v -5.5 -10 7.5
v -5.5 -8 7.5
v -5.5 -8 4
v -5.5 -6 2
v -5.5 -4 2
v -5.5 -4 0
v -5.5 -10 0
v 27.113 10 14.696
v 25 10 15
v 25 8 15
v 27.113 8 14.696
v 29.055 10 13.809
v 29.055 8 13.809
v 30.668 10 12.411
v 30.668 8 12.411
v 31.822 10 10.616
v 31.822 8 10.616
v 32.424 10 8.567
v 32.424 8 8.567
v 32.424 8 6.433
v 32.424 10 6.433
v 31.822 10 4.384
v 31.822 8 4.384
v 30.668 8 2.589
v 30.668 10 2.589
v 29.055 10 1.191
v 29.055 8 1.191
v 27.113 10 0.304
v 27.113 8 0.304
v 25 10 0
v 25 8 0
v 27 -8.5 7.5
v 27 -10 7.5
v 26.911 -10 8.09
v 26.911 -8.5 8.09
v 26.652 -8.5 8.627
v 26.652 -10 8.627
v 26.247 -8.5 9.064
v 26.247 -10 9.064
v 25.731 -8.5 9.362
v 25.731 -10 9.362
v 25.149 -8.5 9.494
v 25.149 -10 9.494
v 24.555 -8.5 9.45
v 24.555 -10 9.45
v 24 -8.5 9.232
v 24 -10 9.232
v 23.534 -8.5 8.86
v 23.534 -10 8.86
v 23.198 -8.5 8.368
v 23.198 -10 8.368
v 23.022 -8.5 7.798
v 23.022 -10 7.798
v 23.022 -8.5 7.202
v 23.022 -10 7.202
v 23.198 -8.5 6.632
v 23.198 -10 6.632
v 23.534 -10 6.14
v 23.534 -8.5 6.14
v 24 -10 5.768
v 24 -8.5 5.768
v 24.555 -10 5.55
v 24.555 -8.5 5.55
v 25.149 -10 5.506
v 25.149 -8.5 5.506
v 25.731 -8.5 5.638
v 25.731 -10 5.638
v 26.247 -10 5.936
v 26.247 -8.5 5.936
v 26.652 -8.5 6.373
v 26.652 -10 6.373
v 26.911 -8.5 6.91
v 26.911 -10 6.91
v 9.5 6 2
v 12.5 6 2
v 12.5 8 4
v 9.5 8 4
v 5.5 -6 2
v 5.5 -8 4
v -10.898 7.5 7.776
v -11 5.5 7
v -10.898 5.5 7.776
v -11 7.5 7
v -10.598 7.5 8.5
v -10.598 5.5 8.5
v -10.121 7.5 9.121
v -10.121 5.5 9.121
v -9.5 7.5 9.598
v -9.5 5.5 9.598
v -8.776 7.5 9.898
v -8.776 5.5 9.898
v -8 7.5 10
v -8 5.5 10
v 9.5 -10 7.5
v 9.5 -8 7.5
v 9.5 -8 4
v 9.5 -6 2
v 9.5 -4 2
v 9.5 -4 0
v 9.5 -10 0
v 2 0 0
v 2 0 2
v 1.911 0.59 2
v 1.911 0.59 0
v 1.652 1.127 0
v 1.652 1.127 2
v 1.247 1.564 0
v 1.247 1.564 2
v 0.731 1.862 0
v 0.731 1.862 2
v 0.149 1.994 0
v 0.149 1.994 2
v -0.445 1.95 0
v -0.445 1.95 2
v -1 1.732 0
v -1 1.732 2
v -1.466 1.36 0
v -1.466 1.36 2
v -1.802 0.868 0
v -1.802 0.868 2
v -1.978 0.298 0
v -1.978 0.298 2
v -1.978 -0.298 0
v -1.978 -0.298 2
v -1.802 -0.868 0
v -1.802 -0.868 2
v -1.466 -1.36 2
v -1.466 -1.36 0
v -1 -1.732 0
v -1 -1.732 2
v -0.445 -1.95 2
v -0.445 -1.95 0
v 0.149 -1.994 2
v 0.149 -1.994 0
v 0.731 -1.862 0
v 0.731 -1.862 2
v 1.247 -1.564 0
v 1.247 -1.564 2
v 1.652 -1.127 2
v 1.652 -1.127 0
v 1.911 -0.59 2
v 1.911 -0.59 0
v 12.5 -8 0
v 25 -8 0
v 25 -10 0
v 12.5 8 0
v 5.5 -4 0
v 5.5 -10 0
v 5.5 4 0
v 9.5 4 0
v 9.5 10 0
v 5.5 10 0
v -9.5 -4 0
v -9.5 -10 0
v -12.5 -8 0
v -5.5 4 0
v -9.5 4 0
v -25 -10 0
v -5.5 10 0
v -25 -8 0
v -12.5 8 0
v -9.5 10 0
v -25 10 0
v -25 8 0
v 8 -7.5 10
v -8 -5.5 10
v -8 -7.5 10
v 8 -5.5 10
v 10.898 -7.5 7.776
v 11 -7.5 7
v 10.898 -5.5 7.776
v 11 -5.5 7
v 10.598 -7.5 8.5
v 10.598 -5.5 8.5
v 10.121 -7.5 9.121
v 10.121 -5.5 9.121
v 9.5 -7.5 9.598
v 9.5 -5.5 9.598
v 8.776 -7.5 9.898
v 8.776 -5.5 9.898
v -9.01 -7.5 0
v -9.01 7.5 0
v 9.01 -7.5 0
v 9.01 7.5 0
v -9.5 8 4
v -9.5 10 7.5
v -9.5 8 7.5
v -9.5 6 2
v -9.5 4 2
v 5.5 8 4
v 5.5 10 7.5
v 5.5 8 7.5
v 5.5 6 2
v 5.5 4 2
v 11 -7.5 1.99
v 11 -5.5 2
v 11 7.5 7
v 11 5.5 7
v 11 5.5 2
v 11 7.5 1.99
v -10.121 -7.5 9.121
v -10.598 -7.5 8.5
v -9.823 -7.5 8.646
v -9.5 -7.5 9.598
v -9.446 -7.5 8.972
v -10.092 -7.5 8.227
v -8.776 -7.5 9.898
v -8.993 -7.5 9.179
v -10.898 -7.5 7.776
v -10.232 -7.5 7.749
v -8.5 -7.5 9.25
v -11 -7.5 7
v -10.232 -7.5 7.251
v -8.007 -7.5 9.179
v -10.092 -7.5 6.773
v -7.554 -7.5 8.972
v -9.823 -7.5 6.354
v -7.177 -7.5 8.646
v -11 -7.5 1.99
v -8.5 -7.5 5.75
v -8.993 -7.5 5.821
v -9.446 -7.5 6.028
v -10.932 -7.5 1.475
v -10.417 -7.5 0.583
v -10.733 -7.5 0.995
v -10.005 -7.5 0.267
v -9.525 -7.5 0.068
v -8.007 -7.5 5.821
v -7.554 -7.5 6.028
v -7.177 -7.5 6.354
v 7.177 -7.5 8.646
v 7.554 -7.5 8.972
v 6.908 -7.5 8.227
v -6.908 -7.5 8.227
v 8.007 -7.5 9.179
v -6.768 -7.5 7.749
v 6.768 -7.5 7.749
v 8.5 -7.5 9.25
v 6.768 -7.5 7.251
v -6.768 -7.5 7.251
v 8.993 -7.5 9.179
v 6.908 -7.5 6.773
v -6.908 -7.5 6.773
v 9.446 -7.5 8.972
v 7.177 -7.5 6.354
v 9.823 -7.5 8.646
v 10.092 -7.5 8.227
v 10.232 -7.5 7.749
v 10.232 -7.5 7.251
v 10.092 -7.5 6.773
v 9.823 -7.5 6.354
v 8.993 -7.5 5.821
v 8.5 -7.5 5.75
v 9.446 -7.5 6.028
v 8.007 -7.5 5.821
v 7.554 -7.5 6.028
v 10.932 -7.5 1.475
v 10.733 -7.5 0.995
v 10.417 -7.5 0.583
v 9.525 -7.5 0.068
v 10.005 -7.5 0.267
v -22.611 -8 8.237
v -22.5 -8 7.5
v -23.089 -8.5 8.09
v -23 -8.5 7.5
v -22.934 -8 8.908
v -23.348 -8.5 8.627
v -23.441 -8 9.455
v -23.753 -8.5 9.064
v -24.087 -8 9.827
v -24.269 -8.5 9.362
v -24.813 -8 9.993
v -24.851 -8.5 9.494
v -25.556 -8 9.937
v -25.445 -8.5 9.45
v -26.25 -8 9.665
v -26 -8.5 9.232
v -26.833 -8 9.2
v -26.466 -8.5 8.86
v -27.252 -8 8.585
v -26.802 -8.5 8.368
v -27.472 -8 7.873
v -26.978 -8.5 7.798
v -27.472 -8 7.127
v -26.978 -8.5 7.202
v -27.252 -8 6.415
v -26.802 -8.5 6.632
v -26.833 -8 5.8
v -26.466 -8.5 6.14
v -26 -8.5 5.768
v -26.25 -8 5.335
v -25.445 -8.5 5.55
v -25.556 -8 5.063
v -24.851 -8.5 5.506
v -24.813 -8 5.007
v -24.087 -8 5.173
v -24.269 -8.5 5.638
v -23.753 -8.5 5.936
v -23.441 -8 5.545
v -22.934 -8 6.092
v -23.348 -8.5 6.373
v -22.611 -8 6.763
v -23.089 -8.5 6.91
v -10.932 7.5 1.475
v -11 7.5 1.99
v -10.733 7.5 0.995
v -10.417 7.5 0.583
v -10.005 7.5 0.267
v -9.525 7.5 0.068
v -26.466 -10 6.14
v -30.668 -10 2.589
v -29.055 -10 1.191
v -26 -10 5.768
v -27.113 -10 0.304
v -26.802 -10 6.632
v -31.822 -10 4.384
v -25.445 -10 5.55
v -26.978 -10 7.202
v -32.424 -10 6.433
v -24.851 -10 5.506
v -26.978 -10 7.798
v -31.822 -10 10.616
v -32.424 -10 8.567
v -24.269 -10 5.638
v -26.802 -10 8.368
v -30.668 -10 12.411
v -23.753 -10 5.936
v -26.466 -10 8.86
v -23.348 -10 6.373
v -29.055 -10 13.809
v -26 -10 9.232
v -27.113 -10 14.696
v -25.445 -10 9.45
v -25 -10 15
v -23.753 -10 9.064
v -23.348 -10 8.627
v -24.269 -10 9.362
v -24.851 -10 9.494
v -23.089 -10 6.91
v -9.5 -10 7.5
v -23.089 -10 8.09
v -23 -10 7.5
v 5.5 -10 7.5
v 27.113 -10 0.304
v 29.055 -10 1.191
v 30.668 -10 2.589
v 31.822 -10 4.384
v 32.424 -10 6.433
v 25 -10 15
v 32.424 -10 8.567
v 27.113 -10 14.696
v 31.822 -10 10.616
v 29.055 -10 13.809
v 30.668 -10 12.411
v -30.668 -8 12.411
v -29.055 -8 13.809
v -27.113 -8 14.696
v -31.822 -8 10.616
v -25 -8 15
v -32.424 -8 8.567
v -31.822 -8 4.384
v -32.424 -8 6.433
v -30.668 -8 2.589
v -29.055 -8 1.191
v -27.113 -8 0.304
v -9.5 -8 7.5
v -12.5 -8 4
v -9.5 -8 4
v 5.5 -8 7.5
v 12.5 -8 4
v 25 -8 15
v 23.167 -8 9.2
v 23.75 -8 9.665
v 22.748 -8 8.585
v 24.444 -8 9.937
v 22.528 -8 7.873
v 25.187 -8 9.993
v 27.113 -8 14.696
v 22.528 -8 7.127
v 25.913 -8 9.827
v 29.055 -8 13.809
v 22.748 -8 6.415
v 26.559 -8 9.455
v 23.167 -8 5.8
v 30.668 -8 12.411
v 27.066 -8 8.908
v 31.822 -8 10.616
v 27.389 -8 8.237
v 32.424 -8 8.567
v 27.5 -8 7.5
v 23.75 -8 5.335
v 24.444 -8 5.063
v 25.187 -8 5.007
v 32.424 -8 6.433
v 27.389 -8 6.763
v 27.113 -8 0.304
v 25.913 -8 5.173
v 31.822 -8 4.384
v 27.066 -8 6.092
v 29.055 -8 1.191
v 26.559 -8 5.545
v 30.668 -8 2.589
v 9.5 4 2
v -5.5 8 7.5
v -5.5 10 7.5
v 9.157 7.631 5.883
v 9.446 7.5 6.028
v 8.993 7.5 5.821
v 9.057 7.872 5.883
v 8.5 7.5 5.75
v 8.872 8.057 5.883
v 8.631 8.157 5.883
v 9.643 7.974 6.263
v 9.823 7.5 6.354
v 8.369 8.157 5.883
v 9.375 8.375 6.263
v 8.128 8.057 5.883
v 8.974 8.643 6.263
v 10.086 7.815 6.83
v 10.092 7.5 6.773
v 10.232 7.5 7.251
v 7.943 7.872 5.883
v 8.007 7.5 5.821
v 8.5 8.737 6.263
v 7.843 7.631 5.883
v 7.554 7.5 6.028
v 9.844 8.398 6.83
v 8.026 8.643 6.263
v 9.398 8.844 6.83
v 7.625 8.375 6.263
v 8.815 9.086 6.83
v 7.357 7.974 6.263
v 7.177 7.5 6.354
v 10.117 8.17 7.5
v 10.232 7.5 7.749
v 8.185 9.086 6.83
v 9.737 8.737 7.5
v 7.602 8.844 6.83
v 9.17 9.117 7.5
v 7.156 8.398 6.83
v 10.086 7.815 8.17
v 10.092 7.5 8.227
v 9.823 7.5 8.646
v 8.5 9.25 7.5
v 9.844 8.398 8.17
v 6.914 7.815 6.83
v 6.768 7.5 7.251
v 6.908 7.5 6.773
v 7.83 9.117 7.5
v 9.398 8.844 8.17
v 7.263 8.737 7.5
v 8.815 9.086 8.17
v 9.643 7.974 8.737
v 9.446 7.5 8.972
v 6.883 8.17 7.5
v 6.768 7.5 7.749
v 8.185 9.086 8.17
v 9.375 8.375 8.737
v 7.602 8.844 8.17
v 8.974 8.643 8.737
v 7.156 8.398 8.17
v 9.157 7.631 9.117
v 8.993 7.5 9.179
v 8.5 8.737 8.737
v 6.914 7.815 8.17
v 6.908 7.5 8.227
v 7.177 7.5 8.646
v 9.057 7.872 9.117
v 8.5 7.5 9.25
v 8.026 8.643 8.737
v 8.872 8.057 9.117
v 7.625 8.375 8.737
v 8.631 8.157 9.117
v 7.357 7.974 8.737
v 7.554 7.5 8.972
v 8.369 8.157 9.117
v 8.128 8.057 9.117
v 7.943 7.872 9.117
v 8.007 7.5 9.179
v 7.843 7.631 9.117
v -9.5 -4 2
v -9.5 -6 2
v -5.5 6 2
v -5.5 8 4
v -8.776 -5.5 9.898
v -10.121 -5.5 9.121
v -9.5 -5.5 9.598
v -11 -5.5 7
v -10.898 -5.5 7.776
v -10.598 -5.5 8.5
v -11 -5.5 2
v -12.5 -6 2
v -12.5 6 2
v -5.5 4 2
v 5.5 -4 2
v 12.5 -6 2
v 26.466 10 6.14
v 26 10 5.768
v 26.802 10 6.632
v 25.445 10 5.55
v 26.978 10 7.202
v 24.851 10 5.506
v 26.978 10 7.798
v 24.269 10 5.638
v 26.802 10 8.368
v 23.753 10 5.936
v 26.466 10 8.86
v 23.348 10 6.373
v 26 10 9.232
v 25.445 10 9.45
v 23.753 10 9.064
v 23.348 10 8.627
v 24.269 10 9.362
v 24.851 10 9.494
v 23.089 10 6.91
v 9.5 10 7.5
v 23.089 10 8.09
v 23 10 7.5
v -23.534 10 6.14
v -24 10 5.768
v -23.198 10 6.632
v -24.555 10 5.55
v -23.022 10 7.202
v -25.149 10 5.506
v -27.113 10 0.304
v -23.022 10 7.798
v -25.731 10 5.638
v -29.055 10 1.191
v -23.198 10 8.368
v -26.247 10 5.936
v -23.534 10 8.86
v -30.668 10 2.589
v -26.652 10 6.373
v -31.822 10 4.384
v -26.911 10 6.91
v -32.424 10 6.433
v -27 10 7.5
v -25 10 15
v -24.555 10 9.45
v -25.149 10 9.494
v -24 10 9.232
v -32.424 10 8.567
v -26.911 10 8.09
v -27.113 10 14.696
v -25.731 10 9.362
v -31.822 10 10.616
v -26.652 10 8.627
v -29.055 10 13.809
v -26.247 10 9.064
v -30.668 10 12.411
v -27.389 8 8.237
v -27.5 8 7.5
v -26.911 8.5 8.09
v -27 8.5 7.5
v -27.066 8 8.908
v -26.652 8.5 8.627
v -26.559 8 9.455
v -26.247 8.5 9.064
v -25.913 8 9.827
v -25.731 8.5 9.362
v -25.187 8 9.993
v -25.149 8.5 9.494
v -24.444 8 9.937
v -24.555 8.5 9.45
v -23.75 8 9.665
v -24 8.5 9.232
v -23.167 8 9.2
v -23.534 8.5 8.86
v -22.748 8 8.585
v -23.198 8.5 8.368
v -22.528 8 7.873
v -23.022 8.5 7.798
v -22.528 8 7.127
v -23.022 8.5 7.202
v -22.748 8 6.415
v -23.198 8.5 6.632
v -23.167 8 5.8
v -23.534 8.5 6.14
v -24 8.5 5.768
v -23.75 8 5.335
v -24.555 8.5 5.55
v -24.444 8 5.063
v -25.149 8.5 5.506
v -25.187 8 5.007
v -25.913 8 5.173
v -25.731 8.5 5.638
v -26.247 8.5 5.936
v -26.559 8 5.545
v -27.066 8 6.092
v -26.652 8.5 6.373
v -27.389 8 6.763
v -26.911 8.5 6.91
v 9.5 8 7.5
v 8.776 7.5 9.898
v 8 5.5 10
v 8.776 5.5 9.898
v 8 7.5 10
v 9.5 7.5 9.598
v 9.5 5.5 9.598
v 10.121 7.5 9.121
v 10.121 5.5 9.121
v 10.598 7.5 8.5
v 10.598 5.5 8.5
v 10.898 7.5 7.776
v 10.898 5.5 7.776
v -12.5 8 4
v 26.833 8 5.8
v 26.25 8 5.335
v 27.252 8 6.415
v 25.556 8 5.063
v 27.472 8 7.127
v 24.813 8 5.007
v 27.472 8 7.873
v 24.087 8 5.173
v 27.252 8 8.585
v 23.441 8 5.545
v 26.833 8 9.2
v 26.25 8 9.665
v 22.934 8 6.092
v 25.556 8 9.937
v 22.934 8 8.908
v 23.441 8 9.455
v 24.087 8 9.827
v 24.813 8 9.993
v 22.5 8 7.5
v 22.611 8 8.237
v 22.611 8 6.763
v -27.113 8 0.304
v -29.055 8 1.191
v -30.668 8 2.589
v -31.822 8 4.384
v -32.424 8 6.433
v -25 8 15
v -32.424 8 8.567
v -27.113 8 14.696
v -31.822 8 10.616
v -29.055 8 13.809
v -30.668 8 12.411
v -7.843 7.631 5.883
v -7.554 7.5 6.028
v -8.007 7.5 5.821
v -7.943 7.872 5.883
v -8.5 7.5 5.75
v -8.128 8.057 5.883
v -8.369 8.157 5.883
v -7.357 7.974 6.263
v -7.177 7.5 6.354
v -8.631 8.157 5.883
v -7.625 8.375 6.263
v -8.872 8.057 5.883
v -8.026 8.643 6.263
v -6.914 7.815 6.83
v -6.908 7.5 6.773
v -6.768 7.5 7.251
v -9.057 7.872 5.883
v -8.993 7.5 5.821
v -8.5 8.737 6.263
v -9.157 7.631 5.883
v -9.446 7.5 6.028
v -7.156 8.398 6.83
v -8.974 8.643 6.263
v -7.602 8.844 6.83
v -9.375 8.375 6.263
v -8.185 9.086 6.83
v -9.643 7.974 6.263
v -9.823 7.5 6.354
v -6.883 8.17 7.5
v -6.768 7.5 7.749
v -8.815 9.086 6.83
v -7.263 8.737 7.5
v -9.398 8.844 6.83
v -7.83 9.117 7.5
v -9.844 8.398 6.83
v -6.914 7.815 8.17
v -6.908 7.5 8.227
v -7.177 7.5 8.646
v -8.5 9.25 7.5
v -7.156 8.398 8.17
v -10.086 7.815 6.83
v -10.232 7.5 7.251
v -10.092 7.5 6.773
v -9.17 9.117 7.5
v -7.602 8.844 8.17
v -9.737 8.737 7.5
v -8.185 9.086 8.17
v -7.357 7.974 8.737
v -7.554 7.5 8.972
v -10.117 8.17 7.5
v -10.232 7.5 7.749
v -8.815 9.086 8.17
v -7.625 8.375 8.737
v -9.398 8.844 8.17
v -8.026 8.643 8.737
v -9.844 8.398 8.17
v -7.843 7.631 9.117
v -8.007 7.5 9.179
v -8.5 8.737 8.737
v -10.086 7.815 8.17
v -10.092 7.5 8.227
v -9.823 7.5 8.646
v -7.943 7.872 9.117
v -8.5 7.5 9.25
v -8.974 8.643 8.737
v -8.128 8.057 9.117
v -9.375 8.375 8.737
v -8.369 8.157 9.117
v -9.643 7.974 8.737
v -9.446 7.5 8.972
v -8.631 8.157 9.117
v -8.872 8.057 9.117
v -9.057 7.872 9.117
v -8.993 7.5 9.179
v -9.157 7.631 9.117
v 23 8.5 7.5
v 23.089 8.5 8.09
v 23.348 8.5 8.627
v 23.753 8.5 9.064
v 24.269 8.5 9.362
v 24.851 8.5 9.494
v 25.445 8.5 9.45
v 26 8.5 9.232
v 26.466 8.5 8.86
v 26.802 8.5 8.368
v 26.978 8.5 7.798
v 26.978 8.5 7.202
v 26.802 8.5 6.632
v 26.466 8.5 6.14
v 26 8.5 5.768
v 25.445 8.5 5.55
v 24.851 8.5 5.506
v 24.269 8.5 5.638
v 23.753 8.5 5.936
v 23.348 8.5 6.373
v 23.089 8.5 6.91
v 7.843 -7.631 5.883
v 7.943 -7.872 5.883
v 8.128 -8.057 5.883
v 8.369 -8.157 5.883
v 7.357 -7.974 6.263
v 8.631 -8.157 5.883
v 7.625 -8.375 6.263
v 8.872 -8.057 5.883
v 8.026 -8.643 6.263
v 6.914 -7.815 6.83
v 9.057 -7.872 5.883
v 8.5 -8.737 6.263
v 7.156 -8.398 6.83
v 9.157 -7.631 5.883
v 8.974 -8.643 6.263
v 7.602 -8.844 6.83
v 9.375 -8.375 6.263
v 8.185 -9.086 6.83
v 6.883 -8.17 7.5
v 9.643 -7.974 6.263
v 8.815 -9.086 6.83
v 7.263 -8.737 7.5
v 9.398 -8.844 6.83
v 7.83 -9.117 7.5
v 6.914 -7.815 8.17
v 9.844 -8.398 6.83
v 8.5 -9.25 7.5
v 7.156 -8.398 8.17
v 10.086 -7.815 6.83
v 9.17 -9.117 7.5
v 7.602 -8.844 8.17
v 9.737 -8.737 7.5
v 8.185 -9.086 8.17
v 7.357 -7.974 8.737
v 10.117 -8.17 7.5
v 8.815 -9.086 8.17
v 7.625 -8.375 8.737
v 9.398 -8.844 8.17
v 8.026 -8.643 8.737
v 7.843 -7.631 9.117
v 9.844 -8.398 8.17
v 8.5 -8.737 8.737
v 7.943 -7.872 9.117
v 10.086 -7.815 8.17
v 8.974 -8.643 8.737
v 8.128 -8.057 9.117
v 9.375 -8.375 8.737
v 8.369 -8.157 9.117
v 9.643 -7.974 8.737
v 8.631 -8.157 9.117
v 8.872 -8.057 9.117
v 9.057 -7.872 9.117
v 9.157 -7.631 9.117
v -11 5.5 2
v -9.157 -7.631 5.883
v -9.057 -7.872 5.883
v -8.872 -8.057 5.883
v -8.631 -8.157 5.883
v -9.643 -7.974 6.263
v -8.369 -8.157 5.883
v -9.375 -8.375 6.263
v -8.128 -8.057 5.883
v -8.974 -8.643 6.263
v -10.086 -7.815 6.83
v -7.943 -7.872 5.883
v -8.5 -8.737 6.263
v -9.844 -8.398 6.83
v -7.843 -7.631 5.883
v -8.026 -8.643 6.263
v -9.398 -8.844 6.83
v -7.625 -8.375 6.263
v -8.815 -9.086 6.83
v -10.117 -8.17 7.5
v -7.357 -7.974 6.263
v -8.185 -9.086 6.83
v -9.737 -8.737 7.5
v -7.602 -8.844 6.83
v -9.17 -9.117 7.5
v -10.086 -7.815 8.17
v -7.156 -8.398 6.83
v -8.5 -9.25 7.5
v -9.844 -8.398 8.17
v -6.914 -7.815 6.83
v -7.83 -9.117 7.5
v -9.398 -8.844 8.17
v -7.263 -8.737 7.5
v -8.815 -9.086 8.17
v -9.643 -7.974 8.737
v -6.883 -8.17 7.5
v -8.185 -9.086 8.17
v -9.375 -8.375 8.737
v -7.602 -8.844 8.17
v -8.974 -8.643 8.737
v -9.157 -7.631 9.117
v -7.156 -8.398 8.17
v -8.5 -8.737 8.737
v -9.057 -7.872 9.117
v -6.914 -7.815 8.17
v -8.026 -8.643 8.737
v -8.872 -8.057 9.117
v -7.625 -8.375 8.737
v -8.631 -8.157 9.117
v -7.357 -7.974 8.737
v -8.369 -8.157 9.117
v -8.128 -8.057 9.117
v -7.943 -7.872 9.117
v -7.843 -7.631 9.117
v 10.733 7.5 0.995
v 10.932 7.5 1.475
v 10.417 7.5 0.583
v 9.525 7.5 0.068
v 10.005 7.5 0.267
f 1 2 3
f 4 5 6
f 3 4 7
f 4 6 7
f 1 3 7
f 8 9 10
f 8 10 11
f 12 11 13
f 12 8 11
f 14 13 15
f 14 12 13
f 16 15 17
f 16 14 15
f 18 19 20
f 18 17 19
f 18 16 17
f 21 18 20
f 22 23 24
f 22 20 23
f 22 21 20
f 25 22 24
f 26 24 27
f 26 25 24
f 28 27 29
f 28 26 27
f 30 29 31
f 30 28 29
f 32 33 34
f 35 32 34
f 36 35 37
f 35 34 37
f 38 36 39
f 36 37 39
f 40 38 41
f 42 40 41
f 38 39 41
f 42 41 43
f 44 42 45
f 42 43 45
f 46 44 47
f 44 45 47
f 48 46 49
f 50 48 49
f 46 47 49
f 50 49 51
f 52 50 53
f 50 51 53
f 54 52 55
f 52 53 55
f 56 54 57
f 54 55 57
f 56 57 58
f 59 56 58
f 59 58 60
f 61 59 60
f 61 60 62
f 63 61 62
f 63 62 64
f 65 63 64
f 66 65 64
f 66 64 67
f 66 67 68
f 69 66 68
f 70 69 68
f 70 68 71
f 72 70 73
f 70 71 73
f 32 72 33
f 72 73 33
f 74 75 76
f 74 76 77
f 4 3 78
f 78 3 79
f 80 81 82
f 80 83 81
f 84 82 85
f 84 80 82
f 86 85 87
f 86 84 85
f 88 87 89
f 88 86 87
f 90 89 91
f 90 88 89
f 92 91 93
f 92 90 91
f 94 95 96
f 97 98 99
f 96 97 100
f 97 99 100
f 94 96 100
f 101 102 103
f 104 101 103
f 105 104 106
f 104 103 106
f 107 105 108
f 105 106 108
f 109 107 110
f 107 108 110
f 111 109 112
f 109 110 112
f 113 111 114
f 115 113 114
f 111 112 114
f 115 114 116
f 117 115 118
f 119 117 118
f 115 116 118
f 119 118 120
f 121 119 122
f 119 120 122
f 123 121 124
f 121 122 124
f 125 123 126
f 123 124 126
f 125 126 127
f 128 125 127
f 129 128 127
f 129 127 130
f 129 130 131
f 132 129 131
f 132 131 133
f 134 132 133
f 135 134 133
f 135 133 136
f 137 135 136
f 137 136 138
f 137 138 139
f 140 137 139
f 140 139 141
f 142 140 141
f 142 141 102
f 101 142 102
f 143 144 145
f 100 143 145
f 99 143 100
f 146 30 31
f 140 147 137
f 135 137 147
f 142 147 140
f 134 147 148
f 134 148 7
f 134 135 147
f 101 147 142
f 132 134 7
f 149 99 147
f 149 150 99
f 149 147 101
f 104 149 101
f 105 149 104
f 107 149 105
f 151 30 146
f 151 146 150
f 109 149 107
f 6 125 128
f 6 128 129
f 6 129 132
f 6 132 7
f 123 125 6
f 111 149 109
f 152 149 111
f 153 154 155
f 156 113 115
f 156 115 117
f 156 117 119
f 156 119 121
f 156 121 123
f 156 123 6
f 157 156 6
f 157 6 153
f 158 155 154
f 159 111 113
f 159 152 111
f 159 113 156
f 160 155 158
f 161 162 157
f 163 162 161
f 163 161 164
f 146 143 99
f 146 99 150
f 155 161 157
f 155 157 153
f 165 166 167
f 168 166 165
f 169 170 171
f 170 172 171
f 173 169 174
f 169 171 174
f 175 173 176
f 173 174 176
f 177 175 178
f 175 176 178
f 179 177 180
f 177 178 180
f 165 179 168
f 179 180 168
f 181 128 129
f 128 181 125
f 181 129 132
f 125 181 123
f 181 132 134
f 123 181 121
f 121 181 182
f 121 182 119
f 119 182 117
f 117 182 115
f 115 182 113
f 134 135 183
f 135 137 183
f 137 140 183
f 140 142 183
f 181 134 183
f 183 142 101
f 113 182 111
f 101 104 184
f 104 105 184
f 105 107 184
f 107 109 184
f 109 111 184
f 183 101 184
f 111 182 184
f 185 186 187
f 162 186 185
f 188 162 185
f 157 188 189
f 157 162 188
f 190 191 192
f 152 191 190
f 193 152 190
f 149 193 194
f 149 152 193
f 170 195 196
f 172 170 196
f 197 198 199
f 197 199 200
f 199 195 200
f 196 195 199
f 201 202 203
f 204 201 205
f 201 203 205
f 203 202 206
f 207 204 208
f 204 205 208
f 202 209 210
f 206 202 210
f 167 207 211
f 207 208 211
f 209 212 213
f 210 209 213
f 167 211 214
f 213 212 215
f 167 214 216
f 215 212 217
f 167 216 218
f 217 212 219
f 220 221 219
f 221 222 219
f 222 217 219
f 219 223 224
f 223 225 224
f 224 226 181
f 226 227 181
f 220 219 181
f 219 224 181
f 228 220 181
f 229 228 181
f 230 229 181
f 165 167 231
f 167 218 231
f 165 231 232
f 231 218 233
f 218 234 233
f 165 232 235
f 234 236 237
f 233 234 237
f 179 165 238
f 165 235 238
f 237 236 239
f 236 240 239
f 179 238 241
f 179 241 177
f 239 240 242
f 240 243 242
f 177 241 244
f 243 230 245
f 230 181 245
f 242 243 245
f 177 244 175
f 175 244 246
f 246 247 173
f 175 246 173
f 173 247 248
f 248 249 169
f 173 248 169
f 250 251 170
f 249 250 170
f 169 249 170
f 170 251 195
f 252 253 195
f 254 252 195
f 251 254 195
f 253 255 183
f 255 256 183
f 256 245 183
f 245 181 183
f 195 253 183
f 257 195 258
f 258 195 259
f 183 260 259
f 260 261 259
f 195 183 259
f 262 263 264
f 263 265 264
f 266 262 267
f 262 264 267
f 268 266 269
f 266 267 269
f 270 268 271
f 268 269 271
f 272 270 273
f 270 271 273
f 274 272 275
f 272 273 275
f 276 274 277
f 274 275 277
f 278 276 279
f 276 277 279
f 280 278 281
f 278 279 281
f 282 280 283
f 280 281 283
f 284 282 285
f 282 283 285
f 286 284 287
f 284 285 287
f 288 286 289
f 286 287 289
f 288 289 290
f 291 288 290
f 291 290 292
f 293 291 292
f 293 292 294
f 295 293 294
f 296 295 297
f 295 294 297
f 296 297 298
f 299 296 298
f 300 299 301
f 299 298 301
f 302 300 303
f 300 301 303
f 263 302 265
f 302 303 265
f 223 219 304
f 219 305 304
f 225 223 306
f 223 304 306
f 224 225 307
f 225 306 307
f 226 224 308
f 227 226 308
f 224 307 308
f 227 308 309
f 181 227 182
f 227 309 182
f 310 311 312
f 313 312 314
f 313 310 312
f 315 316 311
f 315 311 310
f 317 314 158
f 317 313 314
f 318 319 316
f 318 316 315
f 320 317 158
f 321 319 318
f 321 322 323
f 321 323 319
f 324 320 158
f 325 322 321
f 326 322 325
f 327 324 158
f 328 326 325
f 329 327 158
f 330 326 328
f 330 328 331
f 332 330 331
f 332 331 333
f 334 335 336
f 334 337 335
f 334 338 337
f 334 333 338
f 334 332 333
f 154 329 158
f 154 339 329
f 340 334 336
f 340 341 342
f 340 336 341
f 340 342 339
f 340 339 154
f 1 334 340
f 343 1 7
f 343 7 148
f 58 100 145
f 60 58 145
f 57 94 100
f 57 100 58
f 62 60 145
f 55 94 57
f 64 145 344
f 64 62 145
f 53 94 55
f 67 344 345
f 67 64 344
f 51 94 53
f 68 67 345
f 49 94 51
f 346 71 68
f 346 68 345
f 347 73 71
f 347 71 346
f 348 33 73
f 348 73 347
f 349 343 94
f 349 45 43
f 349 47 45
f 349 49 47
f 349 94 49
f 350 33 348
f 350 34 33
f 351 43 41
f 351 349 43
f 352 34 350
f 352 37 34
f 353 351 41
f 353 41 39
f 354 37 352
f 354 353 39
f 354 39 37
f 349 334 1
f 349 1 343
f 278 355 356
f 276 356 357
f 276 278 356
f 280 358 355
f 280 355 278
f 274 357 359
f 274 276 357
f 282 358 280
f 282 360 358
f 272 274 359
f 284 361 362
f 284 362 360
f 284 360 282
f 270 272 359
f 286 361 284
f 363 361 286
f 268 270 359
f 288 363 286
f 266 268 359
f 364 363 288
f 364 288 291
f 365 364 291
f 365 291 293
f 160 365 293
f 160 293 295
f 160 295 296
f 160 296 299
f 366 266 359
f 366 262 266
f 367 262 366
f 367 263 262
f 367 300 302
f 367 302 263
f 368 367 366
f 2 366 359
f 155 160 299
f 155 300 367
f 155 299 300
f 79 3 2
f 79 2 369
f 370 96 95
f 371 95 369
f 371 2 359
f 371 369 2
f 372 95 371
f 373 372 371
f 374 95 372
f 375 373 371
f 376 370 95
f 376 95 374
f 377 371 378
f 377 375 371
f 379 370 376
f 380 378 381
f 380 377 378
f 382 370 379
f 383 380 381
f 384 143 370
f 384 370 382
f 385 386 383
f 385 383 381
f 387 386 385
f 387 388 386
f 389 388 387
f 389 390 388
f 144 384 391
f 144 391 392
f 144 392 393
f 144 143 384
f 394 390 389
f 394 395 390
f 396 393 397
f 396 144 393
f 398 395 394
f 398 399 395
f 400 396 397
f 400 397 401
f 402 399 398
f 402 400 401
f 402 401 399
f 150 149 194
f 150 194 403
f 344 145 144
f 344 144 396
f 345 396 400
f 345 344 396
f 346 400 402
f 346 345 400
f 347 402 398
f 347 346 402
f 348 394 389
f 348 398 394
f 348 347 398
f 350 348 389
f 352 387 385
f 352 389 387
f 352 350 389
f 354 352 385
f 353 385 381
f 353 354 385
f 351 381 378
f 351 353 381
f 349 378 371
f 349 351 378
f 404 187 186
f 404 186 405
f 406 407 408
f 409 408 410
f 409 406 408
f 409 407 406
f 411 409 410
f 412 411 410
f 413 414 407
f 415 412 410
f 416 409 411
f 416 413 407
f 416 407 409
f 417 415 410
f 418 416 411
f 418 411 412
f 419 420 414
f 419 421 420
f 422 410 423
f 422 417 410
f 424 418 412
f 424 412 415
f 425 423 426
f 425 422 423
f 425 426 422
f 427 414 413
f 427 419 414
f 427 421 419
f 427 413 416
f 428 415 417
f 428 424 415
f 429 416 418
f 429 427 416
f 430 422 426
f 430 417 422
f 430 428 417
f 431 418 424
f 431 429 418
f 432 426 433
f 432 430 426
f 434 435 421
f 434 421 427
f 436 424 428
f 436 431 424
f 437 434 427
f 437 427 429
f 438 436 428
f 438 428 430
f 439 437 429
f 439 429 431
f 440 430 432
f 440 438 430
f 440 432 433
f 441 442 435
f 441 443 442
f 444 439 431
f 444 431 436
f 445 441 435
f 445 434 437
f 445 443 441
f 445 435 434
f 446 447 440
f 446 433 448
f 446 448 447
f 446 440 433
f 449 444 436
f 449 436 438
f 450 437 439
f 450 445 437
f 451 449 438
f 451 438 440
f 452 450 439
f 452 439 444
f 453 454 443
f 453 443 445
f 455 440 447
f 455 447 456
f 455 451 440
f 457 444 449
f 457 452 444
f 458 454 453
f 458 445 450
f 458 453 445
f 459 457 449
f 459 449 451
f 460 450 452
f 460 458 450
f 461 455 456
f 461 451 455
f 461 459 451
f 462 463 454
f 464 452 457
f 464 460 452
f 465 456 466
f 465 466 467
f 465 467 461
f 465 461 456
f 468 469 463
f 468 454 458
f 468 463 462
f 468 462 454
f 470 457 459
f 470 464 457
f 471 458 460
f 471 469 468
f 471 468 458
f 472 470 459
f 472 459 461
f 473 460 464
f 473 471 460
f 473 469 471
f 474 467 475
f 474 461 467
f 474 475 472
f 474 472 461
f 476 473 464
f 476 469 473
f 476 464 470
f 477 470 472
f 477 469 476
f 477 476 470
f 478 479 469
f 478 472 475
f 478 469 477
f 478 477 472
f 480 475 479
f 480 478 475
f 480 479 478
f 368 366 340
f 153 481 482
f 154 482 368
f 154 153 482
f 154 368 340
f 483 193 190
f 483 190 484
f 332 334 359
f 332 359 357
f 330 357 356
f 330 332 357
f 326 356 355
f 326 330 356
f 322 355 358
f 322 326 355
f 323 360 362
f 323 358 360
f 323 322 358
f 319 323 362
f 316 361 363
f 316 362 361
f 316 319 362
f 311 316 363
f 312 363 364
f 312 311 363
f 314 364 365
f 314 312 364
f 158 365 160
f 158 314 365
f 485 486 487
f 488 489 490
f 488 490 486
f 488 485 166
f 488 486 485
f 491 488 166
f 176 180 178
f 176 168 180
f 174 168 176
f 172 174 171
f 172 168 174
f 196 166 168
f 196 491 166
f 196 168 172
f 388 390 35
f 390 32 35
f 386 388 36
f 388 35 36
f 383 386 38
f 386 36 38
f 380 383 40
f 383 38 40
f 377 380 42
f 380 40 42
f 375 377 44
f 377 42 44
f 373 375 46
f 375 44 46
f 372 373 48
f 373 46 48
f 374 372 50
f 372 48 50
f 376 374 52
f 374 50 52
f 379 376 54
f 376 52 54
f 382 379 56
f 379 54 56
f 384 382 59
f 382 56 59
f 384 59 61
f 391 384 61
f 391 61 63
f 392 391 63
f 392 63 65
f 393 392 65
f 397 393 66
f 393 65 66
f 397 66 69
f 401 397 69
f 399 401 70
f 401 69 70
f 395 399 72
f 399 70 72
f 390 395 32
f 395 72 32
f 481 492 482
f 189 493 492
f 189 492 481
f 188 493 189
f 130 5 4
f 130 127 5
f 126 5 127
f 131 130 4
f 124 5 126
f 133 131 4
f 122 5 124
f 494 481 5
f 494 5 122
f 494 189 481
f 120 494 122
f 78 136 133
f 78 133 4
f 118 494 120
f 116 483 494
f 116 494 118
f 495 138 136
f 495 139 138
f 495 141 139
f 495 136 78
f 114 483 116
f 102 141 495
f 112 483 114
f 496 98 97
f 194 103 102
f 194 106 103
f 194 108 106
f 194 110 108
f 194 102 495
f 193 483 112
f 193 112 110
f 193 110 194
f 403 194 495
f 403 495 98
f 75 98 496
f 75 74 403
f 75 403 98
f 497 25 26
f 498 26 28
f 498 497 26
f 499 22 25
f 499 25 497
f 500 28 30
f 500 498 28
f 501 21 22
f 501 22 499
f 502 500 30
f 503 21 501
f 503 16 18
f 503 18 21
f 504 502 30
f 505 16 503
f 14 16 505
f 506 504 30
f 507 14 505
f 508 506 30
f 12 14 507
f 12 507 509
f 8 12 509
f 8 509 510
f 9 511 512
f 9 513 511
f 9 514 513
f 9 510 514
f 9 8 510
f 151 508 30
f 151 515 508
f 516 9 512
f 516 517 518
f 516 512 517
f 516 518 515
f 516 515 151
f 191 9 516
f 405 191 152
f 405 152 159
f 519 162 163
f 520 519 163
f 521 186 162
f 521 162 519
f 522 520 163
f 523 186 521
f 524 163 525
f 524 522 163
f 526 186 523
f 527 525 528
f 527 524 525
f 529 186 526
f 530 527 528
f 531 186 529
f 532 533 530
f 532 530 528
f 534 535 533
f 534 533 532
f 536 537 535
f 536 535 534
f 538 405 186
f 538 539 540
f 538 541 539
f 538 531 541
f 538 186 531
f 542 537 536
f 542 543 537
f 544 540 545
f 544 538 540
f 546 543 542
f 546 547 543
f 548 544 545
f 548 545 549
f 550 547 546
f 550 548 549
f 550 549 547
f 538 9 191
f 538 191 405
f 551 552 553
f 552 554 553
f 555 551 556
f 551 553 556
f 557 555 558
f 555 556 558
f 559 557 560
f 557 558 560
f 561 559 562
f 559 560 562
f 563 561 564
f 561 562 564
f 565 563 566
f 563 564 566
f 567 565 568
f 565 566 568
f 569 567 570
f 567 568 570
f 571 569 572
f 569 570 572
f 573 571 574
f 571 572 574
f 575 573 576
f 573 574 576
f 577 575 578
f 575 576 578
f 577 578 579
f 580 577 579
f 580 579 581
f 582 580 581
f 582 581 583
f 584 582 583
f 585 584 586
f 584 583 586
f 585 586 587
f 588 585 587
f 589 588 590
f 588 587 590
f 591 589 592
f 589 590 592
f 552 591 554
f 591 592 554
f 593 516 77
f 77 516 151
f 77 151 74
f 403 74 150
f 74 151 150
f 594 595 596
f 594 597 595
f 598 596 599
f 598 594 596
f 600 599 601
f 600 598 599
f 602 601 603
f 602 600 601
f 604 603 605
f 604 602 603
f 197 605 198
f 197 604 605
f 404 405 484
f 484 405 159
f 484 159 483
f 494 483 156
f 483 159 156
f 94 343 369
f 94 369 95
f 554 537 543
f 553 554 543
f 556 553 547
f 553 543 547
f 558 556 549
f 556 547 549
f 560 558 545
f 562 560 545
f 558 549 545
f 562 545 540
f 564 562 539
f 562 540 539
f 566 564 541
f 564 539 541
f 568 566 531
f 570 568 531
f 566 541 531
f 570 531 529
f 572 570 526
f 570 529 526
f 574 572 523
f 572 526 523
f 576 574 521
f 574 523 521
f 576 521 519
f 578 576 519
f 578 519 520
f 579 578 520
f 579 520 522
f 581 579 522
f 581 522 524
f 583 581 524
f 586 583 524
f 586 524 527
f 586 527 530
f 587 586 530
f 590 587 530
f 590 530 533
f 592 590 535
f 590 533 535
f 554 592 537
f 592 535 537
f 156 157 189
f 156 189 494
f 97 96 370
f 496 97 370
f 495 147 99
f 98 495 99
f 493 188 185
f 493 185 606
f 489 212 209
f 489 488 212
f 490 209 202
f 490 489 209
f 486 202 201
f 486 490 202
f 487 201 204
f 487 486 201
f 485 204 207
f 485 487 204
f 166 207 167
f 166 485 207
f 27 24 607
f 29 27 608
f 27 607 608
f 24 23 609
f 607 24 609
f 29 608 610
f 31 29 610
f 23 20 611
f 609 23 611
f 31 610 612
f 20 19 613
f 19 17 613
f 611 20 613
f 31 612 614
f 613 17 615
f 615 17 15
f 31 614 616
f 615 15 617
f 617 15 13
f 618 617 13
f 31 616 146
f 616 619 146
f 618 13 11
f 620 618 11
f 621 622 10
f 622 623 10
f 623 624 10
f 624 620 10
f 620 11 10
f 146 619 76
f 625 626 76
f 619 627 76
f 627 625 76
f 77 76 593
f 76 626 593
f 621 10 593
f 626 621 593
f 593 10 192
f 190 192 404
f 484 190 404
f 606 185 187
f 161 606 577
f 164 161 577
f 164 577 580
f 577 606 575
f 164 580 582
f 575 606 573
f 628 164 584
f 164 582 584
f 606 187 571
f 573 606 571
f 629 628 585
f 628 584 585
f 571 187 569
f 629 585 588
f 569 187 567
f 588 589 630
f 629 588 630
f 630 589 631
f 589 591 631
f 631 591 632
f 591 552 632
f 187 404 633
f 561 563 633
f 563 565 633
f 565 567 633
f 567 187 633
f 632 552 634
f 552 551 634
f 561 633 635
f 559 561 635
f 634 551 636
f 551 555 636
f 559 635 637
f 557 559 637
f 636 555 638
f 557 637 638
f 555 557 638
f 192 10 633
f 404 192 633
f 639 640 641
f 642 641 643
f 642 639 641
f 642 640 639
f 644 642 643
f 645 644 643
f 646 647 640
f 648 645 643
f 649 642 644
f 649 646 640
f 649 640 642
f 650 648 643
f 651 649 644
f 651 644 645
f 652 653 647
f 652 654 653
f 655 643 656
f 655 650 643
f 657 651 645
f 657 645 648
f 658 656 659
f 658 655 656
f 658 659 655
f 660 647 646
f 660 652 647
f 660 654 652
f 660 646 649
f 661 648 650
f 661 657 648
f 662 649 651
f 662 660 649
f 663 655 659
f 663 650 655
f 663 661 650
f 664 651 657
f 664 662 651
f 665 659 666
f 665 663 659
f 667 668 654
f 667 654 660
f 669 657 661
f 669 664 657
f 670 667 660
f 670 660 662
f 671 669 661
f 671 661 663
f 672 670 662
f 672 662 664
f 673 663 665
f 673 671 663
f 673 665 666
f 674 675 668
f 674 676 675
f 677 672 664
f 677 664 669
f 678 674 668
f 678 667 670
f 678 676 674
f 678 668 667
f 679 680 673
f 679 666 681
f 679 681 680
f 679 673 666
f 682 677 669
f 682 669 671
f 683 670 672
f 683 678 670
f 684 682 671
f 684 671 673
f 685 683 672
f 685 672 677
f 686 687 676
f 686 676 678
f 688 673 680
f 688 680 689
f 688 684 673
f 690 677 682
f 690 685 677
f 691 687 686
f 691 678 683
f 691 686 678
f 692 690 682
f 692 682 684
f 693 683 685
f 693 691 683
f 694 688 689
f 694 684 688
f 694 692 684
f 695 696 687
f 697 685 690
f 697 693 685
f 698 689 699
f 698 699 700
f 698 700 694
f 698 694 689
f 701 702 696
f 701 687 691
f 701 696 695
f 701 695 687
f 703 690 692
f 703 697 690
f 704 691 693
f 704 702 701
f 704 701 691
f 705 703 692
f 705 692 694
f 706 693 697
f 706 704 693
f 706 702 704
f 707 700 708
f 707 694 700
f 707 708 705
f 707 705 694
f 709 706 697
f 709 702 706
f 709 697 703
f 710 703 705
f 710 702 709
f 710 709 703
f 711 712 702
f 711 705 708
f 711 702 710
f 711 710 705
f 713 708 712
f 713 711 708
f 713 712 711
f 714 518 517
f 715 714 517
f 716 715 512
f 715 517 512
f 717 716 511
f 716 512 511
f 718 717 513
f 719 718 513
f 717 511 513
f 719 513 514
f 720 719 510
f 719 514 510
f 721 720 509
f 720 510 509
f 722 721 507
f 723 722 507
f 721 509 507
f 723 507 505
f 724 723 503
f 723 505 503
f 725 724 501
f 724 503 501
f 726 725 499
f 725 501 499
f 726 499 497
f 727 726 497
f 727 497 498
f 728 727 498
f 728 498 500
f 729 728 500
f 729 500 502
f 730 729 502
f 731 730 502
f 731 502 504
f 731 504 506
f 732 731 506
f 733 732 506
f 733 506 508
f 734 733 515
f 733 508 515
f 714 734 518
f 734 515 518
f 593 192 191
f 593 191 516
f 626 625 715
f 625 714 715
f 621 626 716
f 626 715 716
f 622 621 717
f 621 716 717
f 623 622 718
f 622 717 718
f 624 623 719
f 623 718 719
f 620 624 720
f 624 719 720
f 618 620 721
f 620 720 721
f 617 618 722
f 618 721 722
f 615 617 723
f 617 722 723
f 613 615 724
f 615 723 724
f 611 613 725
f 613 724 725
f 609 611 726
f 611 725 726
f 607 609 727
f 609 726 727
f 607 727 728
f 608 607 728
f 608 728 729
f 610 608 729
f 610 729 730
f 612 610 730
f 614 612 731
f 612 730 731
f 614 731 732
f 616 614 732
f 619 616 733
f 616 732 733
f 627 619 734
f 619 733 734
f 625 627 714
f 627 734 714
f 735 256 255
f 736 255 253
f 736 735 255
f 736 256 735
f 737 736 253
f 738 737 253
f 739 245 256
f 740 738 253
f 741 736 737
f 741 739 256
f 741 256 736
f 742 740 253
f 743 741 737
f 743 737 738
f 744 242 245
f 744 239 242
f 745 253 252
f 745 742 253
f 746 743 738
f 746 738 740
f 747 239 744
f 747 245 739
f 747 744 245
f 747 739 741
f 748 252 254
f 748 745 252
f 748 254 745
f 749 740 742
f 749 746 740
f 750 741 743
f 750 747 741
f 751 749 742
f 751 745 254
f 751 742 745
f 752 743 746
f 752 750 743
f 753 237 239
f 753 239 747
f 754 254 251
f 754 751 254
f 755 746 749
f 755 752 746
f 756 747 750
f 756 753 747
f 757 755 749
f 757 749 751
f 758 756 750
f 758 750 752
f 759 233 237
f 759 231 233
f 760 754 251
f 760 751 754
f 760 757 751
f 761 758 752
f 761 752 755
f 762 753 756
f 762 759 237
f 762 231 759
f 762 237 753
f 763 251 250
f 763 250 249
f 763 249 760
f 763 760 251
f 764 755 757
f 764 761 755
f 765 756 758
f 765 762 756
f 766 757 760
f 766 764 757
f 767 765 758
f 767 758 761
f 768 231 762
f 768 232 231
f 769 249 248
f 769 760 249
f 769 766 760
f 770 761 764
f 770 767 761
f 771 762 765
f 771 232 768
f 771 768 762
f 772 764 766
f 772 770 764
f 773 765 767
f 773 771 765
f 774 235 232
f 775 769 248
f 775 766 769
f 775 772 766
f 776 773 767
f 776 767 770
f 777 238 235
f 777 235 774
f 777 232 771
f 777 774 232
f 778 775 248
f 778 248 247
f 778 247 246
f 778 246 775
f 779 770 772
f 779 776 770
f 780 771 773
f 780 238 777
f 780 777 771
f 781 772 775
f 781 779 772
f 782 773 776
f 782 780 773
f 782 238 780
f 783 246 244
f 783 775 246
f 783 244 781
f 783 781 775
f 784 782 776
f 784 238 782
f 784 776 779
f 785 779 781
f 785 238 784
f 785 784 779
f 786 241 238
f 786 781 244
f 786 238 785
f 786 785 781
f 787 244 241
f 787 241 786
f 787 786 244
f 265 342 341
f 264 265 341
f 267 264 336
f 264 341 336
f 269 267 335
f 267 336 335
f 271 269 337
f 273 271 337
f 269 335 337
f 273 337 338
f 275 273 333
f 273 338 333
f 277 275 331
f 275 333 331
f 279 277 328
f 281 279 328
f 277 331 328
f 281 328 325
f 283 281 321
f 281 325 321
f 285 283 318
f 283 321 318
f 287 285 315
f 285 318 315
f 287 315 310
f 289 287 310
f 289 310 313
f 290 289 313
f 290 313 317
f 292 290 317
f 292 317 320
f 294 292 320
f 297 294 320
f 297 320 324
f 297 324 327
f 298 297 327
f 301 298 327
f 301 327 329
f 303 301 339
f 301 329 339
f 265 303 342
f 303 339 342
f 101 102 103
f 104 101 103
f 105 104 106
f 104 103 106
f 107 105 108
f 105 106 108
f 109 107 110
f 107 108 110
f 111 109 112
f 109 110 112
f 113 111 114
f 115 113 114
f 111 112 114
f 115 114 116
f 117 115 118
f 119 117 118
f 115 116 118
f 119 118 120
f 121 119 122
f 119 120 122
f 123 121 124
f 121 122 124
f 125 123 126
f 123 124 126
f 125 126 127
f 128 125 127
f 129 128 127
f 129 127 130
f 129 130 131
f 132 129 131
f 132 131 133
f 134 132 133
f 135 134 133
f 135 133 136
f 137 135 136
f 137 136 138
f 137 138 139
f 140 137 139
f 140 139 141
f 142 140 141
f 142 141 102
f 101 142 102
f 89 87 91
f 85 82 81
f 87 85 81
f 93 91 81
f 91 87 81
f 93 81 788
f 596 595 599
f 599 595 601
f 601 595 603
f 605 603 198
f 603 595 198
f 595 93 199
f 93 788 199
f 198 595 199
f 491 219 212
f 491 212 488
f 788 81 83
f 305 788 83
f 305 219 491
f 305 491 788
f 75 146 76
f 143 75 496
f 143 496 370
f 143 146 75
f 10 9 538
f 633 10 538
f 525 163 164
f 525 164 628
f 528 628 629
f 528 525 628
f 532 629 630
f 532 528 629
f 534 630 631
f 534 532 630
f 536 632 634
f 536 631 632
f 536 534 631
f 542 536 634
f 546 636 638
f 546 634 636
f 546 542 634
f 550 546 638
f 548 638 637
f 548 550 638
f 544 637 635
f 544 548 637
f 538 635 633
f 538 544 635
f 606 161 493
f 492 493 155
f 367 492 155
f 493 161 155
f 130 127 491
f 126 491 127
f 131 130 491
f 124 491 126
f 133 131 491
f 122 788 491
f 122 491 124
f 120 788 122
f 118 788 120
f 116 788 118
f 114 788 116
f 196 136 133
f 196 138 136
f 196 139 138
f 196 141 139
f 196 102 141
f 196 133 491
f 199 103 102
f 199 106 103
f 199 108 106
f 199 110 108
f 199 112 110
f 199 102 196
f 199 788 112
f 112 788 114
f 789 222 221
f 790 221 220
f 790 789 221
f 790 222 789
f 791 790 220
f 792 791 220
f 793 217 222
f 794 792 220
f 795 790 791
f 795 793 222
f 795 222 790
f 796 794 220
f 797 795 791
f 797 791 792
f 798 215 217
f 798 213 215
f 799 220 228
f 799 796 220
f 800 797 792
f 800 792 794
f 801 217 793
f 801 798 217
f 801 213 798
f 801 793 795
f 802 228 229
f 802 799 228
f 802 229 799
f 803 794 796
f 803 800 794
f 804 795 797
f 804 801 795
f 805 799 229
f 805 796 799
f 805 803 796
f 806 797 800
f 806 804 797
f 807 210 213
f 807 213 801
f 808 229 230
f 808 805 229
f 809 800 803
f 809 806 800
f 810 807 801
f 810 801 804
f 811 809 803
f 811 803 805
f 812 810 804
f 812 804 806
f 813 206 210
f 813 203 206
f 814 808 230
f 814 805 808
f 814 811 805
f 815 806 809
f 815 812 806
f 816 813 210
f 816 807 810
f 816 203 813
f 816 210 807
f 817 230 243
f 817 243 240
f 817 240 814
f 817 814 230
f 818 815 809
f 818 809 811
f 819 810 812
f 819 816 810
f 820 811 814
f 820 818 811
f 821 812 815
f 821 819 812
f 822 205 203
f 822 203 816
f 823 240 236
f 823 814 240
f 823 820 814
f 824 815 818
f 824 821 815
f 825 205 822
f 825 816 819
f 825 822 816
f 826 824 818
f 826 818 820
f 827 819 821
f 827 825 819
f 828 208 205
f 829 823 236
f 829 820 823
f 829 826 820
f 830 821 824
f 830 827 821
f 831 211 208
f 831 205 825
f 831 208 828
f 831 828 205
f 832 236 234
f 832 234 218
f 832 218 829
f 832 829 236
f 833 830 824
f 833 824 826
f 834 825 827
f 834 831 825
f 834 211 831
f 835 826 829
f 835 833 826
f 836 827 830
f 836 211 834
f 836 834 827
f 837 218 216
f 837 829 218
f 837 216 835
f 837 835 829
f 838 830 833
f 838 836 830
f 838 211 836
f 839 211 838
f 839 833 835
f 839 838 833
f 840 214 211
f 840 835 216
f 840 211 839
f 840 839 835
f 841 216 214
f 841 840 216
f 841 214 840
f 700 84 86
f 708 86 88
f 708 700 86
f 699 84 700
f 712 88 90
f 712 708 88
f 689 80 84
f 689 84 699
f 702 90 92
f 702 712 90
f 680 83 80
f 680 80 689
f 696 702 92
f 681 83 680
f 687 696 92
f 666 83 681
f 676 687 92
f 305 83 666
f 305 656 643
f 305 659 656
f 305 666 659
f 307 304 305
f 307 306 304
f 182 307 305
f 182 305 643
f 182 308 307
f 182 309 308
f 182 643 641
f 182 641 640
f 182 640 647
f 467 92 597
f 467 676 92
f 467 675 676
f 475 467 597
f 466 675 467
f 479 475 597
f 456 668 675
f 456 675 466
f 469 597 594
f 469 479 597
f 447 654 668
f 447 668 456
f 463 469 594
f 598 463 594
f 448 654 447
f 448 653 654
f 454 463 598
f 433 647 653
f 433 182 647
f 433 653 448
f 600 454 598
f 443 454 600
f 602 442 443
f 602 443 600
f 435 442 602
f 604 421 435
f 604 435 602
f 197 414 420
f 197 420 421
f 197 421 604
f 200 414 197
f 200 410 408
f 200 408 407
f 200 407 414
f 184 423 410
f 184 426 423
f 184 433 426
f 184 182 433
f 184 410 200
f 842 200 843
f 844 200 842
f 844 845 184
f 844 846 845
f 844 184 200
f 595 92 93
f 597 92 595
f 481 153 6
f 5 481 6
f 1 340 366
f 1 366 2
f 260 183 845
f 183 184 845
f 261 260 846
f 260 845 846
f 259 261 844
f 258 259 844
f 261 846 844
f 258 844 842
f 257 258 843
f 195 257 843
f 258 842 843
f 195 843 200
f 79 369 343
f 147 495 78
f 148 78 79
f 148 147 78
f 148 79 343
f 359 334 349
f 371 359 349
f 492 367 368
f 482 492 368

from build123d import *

# Parameters (mm, degrees)
SKETCH004_W     = 22
SKETCH004_H     = 15
PAD003_DEPTH    = 2
SKETCH005_W     = 22
SKETCH005_H     = 2
PAD004_DEPTH    = 8
FILLET_R        = 3
FILLET001_R     = 1.99
SKETCH006_R     = 2
POCKET001_DEPTH = 2.001
SKETCH_W        = 40
SKETCH_H        = 20
PAD_DEPTH       = 2
SKETCH001_R     = 2
PAD001_DEPTH    = 2
SKETCH002_R     = 2
PAD002_DEPTH    = 2
CHAMFER_SIZE    = 0.5
CHAMFER001_SIZE = 1.99
CHAMFER002_SIZE = 2
SKETCH003_W     = 20
SKETCH003_H     = 16
POCKET_DEPTH    = 5
SKETCH007_R     = 2
POCKET002_DEPTH = 5
SKETCH008_W     = 4
SKETCH008_H     = 8
POCKET003_DEPTH = 7.5


with BuildPart() as sph_re003:
    # Sphere003 → Sphere003 (revolve)
    with BuildSketch(Plane(origin=(-8.5, 7.5, 7.5), x_dir=(1, 0, 0), z_dir=(0, -1, 0))):
        with BuildLine():
            ThreePointArc((0, -1.75), (1.75, 0), (0, 1.75))
            Line((0, 1.75), (0, -1.75))
        make_face()
    revolve(axis=Axis((-8.5, 7.5, 7.5), (0, 0, 1)))


with BuildPart() as fusion002:
    # Sphere002 → Sphere002 (revolve)
    with BuildSketch(Plane(origin=(8.5, 7.5, 7.5), x_dir=(1, 0, 0), z_dir=(0, -1, 0))):
        with BuildLine():
            ThreePointArc((0, -1.75), (1.75, 0), (0, 1.75))
            Line((0, 1.75), (0, -1.75))
        make_face()
    revolve(axis=Axis((8.5, 7.5, 7.5), (0, 0, 1)))

    # Fusion002: union Sphère003
    add(sph_re003.part)


with BuildPart() as sph_re001:
    # Sphere001 → Sphere001 (revolve)
    with BuildSketch(Plane(origin=(8.5, -7.5, 7.5), x_dir=(1, 0, 0), z_dir=(0, -1, 0))):
        with BuildLine():
            ThreePointArc((0, -1.75), (1.75, 0), (0, 1.75))
            Line((0, 1.75), (0, -1.75))
        make_face()
    revolve(axis=Axis((8.5, -7.5, 7.5), (0, 0, 1)))


with BuildPart() as fusion:
    # Sphere → Sphere (revolve)
    with BuildSketch(Plane(origin=(-8.5, -7.5, 7.5), x_dir=(1, 0, 0), z_dir=(0, -1, 0))):
        with BuildLine():
            ThreePointArc((0, -1.75), (1.75, 0), (0, 1.75))
            Line((0, 1.75), (0, -1.75))
        make_face()
    revolve(axis=Axis((-8.5, -7.5, 7.5), (0, 0, 1)))

    # Fusion: union Sphère001
    add(sph_re001.part)


with BuildPart() as agraphe007:
    # Sketch004 → Pad003 (new body)
    with BuildSketch(Plane.XY):
        Rectangle(SKETCH004_W, SKETCH004_H)
    extrude(amount=PAD003_DEPTH)

    # Sketch005 → Pad004 (new body)
    with BuildSketch(Plane.XY.offset(2)):
        with Locations((0, 6.5)):
            Rectangle(SKETCH005_W, SKETCH005_H)
        with Locations((0, -6.5)):
            Rectangle(SKETCH005_W, SKETCH005_H)
    extrude(amount=PAD004_DEPTH)

    # Fusion001: union Fusion
    add(fusion.part)

    # Fusion003: union Fusion002
    add(fusion002.part)

    # Fillet
    fillet_edges = [agraphe007.edges().sort_by_distance(p)[0] for p in [
        (11, 6.5, 10),
        (11, -6.5, 10),
        (-11, -6.5, 10),
        (-11, 6.5, 10),
    ]]
    fillet(fillet_edges, radius=FILLET_R)

    # Fillet001
    fillet001_edges = [agraphe007.edges().sort_by_distance(p)[0] for p in [
        (11, 0, 0),
        (-11, 0, 0),
    ]]
    fillet(fillet001_edges, radius=FILLET001_R)

    # Sketch006 → Pocket001 (cut, through all)
    with BuildSketch(Plane.XY.offset(2)):
        Circle(SKETCH006_R)
    extrude(amount=-POCKET001_DEPTH, mode=Mode.SUBTRACT)


with BuildPart() as pento008:
    # Sketch → Pad (new body)
    with BuildSketch(Plane.XY):
        Rectangle(SKETCH_W, SKETCH_H)
    extrude(amount=PAD_DEPTH)

    # Sketch001 → Pad001 (new body)
    with BuildSketch(Plane.XZ.offset(10)):
        with BuildLine():
            ThreePointArc((-25, 15), (-32.5, 7.5), (-25, 0))
            Line((-25, 0), (25, 0))
            ThreePointArc((25, 0), (32.5, 7.5), (25, 15))
            Line((-25, 15), (25, 15))
        make_face()
        with Locations((-25, 7.5)):
            Circle(SKETCH001_R, mode=Mode.SUBTRACT)
        with Locations((25, 7.5)):
            Circle(SKETCH001_R, mode=Mode.SUBTRACT)
    extrude(amount=-PAD001_DEPTH)

    # Sketch002 → Pad002 (new body)
    with BuildSketch(Plane(origin=(0, 10, 0), x_dir=(-1, 0, 0), z_dir=(0, 1, 0))):
        with BuildLine():
            ThreePointArc((-25, 15), (-32.5, 7.5), (-25, 0))
            Line((-25, 0), (25, 0))
            ThreePointArc((25, 0), (32.5, 7.5), (25, 15))
            Line((-25, 15), (25, 15))
        make_face()
        with Locations((-25, 7.5)):
            Circle(SKETCH002_R, mode=Mode.SUBTRACT)
        with Locations((25, 7.5)):
            Circle(SKETCH002_R, mode=Mode.SUBTRACT)
    extrude(amount=-PAD002_DEPTH)

    # Chamfer
    chamfer_edges = [pento008.edges().sort_by_distance(p)[0] for p in [
        (23, -8, 7.5),
        (-27, -8, 7.5),
        (-23, 8, 7.5),
        (27, 8, 7.5),
    ]]
    chamfer(chamfer_edges, length=CHAMFER_SIZE)

    # Chamfer001
    chamfer001_edges = [pento008.edges().sort_by_distance(p)[0] for p in [
        (20, 0, 2),
        (-20, 0, 2),
    ]]
    chamfer(chamfer001_edges, length=CHAMFER001_SIZE)

    # Chamfer002
    chamfer002_edges = [pento008.edges().sort_by_distance(p)[0] for p in [
        (0, -8, 2),
        (0, 8, 2),
    ]]
    chamfer(chamfer002_edges, length=CHAMFER002_SIZE)

    # Sketch003 → Pocket (cut)
    with BuildSketch(Plane(origin=(0, 0, 0), x_dir=(1, 0, 0), z_dir=(0, 0, -1))):
        with Locations((-22.5, 0)):
            Rectangle(SKETCH003_W, SKETCH003_H)
        with Locations((22.5, 0)):
            Rectangle(SKETCH003_W, SKETCH003_H)
    extrude(amount=-POCKET_DEPTH, mode=Mode.SUBTRACT)

    # Sketch007 → Pocket002 (cut)
    with BuildSketch(Plane.XY.offset(2)):
        Circle(SKETCH007_R)
    extrude(amount=-POCKET002_DEPTH, mode=Mode.SUBTRACT)

    # Sketch008 → Pocket003 (cut)
    with BuildSketch(Plane(origin=(0, 0, 0), x_dir=(1, 0, 0), z_dir=(0, 0, -1))):
        with Locations((-7.5, 8)):
            Rectangle(SKETCH008_W, SKETCH008_H)
        with Locations((7.5, 8)):
            Rectangle(SKETCH008_W, SKETCH008_H)
        with Locations((7.5, -8)):
            Rectangle(SKETCH008_W, SKETCH008_H)
        with Locations((-7.5, -8)):
            Rectangle(SKETCH008_W, SKETCH008_H)
    extrude(amount=-POCKET003_DEPTH, mode=Mode.SUBTRACT)


solid = Compound([agraphe007.part, pento008.part])
